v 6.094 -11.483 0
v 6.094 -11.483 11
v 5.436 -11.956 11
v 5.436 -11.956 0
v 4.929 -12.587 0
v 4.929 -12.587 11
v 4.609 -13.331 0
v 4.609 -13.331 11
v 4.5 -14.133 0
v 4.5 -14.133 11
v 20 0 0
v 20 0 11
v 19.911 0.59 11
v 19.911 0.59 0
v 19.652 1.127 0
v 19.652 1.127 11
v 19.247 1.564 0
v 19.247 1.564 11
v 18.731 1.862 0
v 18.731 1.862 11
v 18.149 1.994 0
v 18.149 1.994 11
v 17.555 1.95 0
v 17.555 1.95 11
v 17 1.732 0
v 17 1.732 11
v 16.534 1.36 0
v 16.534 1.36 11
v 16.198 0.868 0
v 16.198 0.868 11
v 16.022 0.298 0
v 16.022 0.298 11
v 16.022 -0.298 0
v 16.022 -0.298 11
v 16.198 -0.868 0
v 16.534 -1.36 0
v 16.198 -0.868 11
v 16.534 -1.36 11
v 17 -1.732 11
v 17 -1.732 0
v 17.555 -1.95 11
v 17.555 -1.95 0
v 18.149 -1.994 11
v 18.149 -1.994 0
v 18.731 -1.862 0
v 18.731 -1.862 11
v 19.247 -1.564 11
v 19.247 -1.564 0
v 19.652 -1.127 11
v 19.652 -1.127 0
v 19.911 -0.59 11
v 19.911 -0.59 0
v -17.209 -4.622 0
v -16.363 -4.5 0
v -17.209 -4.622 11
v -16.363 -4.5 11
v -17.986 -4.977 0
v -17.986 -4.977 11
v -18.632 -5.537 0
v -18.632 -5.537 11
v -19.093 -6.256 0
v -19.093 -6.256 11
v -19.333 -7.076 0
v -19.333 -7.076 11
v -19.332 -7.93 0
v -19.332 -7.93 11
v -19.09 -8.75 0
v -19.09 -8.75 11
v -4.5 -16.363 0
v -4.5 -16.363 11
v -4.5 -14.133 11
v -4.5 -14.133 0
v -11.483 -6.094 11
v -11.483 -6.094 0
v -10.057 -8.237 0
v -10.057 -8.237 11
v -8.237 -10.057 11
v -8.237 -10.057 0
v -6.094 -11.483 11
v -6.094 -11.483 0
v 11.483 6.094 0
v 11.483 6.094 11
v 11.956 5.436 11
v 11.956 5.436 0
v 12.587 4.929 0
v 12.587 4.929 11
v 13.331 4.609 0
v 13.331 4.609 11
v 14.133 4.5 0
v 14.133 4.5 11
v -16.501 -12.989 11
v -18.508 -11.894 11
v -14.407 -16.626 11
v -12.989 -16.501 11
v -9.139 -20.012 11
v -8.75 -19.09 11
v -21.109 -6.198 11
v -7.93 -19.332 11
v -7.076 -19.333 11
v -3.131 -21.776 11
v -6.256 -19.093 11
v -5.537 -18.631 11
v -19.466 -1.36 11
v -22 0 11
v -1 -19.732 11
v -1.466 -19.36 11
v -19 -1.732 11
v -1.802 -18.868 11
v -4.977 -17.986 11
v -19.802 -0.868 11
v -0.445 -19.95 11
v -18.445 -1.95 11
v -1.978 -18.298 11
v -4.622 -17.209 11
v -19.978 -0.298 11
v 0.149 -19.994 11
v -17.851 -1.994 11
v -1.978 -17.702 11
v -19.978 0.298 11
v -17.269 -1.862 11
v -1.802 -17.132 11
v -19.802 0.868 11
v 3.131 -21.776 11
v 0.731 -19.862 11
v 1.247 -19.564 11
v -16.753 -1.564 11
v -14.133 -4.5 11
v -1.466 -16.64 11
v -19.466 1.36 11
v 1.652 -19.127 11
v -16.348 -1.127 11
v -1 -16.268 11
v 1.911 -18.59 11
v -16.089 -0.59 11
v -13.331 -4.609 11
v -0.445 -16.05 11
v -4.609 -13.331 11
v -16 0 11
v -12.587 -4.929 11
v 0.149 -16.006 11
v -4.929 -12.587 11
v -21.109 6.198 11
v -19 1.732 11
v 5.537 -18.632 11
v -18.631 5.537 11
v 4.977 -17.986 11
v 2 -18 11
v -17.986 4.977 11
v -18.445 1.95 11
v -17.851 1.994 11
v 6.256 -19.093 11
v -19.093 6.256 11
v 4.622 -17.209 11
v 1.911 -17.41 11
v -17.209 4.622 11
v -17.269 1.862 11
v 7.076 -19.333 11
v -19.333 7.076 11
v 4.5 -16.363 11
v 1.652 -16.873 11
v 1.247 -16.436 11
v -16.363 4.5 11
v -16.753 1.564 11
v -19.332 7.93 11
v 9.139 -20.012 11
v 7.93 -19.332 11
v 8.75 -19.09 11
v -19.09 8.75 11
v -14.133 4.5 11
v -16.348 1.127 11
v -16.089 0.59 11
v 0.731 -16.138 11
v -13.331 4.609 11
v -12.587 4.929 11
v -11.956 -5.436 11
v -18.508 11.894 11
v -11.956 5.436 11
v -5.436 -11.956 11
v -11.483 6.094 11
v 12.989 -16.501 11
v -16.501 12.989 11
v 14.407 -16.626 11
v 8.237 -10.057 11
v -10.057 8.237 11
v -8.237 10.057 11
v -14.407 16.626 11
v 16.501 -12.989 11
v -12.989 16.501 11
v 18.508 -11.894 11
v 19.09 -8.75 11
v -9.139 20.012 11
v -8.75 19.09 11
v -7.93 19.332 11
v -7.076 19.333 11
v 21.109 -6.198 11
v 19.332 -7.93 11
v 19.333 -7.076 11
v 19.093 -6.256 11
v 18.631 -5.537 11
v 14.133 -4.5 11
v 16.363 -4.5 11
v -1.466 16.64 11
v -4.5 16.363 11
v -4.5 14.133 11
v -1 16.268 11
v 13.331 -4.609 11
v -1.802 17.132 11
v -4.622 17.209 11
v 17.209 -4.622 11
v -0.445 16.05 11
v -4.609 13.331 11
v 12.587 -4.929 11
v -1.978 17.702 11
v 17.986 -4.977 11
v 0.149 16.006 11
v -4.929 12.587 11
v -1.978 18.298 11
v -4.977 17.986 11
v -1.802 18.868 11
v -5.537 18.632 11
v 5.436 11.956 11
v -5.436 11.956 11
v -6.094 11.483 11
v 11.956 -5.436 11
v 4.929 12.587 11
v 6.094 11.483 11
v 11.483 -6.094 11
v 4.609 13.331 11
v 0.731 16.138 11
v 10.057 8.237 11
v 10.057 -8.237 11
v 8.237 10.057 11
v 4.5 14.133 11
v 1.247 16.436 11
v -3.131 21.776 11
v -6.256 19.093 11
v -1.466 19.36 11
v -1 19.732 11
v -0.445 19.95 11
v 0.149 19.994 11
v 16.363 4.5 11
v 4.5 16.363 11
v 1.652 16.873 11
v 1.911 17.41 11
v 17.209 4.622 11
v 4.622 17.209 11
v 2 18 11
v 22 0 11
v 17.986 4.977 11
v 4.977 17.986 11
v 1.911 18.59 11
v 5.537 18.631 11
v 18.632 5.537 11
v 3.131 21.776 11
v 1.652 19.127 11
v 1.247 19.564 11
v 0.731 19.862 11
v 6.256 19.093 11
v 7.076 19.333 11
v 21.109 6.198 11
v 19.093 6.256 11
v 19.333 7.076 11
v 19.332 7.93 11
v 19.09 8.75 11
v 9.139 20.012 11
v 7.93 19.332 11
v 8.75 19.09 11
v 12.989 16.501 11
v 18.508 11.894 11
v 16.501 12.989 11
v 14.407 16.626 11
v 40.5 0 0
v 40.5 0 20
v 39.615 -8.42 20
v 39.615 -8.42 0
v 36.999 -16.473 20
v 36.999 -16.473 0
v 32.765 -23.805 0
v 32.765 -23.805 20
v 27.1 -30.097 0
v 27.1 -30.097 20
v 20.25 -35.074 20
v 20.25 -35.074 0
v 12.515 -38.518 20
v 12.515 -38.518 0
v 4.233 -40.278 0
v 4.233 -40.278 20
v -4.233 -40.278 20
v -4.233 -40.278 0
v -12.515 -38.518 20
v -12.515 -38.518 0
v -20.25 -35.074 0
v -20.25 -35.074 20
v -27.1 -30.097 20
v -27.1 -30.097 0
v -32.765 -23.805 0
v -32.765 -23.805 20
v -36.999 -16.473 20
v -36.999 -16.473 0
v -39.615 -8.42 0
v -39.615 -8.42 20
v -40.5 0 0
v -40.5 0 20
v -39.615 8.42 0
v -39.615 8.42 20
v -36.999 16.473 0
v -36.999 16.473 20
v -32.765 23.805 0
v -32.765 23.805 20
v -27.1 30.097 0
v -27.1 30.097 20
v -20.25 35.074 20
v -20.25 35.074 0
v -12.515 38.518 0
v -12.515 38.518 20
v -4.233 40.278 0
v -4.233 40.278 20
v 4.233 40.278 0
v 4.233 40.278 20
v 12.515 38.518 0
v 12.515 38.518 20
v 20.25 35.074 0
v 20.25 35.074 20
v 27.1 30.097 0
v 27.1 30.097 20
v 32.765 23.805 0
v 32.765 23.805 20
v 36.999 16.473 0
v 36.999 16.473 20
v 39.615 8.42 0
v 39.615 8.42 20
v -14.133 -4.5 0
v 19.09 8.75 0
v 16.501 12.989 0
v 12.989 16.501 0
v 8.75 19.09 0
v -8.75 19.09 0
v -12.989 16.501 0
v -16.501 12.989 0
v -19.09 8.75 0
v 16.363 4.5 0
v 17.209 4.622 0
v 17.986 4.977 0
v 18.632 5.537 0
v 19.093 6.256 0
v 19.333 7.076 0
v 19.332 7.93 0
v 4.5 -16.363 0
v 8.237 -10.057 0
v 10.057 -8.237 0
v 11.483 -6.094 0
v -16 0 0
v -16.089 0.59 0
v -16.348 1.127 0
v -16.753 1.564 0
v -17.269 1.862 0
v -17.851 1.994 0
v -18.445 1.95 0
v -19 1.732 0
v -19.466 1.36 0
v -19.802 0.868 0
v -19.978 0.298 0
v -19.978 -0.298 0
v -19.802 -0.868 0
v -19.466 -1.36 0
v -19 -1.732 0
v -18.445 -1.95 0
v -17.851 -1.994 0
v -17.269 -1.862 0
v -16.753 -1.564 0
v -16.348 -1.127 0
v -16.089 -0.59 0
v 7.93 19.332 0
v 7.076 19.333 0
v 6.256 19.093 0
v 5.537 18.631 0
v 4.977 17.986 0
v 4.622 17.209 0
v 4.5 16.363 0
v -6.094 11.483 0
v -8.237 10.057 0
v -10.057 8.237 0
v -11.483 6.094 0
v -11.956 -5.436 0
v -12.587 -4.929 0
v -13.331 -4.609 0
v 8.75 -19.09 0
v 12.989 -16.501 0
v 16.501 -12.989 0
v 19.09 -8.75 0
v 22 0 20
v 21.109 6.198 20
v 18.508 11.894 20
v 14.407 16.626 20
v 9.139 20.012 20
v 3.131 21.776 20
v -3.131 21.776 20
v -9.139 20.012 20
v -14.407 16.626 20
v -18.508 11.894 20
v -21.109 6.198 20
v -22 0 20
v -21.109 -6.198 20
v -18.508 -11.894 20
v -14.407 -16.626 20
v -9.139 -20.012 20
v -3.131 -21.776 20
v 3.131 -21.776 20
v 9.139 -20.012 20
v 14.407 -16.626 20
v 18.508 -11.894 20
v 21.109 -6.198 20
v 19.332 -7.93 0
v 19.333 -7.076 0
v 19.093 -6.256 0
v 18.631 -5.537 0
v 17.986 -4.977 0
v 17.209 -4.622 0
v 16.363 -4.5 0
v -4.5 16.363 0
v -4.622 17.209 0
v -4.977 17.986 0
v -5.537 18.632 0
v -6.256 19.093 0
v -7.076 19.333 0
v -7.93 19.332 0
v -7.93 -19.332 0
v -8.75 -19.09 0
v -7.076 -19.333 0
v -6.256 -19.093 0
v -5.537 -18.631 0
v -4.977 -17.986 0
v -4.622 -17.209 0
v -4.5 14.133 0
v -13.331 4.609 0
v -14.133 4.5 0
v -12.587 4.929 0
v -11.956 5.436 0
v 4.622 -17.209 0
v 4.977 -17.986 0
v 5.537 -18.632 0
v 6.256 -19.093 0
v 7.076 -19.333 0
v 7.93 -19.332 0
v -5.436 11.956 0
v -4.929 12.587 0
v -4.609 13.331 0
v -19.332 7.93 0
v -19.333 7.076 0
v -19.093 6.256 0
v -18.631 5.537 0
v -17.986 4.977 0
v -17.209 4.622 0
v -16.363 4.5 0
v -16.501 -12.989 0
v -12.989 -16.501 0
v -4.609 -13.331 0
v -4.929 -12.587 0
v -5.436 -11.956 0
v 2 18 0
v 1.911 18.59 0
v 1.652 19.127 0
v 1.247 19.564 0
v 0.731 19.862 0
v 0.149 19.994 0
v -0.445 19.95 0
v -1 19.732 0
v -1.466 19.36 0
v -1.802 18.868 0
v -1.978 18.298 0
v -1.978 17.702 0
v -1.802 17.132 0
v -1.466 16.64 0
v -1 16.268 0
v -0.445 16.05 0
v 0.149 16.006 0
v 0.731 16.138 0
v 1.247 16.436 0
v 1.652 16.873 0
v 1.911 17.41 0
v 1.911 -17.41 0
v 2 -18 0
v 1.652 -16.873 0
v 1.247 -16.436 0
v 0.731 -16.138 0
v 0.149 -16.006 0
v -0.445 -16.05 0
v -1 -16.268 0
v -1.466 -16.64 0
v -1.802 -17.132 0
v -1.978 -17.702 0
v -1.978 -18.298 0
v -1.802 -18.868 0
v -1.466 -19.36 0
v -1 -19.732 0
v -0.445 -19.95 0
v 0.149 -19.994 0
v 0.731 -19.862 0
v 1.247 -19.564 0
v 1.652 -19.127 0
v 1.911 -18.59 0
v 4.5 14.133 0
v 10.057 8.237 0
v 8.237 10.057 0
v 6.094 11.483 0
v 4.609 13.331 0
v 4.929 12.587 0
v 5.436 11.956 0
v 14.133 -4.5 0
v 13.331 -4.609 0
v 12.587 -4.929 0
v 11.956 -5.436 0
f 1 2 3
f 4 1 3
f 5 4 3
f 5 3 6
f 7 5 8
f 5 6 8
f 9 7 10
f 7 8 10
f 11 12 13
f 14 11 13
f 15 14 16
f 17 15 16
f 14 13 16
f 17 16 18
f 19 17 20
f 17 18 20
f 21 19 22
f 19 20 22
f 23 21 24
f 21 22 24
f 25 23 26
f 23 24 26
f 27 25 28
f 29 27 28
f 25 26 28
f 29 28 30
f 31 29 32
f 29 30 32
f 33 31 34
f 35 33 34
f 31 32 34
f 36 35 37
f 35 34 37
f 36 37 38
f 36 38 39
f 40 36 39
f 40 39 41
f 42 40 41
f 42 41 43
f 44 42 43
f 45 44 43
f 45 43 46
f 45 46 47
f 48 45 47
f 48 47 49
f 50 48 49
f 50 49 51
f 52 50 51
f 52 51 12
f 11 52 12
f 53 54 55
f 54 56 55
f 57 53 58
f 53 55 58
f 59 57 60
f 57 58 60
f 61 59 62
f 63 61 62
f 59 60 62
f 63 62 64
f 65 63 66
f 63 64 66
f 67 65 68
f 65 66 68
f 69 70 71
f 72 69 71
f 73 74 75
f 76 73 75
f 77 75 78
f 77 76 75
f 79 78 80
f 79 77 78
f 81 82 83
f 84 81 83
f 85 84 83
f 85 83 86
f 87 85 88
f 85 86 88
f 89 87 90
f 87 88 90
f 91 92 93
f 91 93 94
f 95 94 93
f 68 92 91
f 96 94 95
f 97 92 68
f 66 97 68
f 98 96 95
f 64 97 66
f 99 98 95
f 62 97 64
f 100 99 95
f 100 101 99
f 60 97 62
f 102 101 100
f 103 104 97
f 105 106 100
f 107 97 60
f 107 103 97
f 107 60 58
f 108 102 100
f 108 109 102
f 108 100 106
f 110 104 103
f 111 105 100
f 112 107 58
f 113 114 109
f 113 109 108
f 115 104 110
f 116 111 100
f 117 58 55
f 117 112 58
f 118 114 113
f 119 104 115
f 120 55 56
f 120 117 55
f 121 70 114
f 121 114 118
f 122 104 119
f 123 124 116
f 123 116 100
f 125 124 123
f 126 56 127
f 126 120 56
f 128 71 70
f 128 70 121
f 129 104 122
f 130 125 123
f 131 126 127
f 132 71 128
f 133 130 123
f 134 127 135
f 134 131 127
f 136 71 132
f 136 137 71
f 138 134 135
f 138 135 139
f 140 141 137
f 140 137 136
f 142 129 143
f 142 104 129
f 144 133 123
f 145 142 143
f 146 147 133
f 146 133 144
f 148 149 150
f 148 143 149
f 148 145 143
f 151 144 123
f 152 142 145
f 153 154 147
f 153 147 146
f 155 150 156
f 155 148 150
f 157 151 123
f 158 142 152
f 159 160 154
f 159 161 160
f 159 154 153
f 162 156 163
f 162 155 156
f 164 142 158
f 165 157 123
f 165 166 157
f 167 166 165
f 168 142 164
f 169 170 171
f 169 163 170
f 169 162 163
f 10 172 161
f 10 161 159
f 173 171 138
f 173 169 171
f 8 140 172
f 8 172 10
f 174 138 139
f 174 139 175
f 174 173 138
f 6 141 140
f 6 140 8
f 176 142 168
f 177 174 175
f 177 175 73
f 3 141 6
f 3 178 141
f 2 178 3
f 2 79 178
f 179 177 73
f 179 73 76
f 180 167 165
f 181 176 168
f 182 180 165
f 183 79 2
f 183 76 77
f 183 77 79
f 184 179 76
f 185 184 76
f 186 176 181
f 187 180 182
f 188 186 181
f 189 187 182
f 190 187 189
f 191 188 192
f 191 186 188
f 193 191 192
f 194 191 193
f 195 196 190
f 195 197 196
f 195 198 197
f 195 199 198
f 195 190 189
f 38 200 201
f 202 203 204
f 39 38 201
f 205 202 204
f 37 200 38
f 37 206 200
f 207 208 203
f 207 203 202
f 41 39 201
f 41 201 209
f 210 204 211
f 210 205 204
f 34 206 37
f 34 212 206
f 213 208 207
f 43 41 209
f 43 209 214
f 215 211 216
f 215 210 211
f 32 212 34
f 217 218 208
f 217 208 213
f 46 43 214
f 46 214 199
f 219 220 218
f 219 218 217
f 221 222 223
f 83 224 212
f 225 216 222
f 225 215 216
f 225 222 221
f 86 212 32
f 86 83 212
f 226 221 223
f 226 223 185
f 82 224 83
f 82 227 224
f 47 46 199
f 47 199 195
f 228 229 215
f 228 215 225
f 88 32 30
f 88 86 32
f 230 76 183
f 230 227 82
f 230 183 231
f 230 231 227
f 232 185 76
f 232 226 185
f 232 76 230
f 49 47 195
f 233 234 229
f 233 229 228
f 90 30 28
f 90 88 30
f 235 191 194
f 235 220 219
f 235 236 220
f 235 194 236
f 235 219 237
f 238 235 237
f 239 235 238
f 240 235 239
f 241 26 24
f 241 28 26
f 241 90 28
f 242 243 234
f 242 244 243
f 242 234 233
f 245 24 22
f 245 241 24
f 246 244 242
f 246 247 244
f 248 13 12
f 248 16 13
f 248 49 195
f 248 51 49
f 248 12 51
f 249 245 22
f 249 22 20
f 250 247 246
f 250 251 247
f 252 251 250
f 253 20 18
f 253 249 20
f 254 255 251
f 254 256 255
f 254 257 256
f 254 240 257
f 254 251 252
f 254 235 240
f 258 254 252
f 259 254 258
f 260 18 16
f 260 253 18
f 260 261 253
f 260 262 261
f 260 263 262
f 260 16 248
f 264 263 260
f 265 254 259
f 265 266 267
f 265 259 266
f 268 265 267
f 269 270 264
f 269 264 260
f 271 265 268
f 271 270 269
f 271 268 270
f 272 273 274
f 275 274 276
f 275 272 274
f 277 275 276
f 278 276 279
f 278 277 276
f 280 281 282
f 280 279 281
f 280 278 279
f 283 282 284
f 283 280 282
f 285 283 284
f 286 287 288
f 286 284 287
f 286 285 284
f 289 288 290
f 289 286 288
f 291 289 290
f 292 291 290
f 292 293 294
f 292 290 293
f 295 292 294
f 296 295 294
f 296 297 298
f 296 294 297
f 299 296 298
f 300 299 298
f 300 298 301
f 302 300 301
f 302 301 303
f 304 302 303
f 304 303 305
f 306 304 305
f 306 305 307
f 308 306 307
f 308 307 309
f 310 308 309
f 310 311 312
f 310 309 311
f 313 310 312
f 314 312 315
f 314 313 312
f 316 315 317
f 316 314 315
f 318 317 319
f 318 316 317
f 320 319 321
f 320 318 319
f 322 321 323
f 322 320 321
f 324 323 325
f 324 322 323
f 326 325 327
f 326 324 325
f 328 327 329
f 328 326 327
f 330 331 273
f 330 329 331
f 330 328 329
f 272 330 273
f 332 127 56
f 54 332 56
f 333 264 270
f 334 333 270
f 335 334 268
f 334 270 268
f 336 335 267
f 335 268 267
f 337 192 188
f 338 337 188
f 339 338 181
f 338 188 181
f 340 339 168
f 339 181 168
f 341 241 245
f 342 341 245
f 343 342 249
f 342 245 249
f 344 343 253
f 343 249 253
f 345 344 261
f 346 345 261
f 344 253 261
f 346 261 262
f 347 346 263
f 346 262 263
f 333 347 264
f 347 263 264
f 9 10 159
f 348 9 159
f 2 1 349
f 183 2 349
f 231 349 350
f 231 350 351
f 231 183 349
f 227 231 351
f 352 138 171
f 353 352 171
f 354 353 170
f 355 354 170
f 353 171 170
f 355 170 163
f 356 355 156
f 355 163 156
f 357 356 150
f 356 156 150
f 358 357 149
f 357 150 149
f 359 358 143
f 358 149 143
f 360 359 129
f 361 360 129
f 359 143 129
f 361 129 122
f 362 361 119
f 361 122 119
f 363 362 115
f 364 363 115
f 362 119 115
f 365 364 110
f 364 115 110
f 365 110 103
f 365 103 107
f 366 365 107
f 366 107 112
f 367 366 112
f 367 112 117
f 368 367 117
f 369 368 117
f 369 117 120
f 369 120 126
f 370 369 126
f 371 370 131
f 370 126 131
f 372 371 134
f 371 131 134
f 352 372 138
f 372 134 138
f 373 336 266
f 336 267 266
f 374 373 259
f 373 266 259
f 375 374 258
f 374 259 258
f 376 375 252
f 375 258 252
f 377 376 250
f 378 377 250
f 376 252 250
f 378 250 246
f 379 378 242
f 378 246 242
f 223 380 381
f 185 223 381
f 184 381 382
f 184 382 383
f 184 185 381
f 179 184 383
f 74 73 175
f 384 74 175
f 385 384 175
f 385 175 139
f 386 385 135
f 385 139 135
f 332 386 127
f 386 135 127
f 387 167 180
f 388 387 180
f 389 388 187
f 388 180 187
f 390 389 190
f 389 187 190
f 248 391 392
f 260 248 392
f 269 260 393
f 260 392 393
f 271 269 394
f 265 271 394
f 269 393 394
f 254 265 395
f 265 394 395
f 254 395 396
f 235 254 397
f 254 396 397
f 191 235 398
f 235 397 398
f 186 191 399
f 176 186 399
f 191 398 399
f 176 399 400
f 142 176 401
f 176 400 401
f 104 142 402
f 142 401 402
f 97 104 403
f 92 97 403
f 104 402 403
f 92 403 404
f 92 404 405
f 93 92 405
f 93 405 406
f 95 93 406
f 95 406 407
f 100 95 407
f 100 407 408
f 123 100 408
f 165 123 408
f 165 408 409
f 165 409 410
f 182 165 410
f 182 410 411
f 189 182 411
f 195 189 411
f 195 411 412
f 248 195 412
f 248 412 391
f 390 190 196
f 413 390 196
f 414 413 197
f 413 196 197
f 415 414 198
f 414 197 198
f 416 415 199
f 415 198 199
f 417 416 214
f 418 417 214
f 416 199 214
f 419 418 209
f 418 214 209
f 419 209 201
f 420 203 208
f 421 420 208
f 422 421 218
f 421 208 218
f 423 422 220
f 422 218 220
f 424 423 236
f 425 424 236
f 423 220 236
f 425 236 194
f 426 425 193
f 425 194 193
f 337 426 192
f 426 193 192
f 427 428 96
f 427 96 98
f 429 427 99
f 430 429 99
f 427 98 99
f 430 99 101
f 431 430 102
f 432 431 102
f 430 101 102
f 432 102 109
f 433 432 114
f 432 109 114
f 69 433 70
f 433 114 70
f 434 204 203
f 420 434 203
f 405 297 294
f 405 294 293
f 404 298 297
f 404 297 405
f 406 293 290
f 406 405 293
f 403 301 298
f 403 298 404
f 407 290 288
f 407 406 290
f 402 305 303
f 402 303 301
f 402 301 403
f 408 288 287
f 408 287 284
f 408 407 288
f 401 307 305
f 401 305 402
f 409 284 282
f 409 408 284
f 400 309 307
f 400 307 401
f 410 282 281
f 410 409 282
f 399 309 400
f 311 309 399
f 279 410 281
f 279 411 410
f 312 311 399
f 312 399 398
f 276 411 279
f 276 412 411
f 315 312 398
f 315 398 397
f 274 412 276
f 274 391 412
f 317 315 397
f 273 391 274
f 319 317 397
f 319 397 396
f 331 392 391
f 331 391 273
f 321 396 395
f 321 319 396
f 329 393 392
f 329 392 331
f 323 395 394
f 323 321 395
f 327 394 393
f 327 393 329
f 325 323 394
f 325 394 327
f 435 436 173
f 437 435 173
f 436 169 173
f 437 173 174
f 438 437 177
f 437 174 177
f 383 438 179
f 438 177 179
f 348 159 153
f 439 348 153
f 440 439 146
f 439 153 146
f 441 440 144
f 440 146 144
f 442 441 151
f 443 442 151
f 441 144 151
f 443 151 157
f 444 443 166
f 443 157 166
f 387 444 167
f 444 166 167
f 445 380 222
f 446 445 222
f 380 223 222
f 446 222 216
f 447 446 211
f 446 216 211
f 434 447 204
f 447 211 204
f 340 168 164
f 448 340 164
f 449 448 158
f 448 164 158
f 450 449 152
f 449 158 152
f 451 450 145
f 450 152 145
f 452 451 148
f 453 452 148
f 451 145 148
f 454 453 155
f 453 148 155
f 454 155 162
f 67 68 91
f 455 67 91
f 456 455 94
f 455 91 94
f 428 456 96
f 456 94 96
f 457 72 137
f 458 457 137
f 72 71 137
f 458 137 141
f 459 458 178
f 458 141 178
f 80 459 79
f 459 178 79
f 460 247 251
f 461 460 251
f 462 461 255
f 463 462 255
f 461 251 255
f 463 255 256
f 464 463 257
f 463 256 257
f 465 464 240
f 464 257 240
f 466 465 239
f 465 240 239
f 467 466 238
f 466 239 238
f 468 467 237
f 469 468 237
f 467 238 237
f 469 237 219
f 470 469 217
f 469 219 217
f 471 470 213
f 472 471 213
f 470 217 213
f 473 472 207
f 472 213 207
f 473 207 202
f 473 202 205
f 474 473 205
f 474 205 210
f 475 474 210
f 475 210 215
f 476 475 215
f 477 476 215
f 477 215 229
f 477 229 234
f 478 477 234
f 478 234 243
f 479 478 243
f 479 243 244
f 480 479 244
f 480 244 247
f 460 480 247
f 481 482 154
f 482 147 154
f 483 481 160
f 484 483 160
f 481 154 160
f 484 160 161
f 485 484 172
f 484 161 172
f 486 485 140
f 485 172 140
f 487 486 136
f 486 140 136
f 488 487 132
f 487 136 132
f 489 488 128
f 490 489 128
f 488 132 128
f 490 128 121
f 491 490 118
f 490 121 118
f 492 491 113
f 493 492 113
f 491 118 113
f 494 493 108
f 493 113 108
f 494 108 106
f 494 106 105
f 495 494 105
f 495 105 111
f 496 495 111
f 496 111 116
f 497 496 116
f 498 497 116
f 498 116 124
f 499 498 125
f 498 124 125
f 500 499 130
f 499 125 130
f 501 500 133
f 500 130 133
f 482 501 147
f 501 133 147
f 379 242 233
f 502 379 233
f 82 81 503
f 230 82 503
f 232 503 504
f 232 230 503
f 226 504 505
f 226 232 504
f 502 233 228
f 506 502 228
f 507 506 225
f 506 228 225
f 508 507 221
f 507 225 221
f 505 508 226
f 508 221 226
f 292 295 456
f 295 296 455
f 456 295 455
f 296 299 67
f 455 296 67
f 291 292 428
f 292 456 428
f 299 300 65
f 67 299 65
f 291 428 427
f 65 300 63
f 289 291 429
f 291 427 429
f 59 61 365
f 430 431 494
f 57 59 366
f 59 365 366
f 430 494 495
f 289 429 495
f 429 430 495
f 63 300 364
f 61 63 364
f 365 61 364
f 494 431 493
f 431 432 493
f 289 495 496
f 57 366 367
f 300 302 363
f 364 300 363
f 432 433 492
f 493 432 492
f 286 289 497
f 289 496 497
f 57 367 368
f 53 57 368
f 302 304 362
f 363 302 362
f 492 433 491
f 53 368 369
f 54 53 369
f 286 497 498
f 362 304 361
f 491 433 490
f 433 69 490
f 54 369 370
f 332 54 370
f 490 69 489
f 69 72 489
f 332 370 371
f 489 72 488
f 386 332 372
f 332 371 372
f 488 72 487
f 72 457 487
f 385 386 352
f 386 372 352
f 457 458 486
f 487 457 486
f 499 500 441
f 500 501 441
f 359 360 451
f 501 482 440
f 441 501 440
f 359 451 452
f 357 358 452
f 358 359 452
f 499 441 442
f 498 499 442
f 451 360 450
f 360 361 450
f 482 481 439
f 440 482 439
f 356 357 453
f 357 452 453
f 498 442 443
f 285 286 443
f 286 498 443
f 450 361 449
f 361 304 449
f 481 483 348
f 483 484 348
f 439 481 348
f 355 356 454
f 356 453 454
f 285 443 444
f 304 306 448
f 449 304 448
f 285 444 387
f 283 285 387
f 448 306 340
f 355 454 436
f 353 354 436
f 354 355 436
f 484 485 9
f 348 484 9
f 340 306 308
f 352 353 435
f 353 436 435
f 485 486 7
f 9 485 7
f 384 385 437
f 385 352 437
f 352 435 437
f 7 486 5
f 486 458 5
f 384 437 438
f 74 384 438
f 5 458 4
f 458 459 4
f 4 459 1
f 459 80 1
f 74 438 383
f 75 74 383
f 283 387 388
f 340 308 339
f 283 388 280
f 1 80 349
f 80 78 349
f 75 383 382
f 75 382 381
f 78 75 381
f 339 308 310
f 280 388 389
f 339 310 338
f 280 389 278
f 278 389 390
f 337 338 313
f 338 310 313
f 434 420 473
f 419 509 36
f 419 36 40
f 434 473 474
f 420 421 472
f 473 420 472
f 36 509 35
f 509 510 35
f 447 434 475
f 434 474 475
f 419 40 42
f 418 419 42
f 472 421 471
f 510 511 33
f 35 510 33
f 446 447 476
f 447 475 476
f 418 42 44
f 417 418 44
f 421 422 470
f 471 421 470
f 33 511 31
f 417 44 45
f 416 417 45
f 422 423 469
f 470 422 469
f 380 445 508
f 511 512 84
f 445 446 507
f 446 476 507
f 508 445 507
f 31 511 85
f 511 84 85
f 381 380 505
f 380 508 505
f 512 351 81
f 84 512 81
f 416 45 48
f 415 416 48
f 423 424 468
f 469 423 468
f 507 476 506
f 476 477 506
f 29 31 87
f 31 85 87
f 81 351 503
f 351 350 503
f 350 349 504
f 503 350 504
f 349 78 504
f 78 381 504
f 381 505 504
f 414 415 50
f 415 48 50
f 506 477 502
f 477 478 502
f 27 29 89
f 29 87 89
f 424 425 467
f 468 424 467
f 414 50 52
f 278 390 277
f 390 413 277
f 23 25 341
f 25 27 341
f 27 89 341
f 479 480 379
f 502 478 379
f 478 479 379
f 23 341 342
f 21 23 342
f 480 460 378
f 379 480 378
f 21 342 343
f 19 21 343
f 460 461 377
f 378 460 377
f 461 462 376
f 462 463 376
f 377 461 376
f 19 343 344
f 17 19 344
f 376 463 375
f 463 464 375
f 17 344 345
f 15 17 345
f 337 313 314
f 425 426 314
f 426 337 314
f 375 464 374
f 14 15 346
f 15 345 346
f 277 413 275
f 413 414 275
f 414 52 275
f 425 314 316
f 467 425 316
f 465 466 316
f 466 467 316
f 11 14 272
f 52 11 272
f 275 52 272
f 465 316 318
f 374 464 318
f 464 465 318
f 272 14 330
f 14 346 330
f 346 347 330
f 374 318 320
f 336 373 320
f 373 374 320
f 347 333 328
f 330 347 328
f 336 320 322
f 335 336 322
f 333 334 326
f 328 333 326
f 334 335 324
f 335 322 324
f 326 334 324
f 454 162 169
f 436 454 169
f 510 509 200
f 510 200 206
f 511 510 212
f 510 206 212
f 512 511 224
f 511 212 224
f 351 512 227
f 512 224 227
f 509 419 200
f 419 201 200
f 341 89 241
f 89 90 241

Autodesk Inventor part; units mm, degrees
sketch "Sketch1" plane through (0, 0, 0) normal (0, 0, 1) x (1, 0, 0)
  circle A0 centre (0, 0) radius 40.5
  dimension "d0" = 81
extrude "Extrusion1" add sketch "Sketch1" along normal blind 20
sketch "Sketch2" plane through (0, 0, 20) normal (0, 0, 1) x (1, 0, 0)
  circle A0 centre (0, 0) radius 22
  dimension "d3" = 44
extrude "Extrusion2" cut sketch "Sketch2" against normal blind 9
sketch "Sketch3" plane through (0, 0, 11) normal (0, 0, 1) x (1, 0, 0)
  circle A0 centre (0, 18) radius 2
  circle A1 centre (-18, 0) radius 2
  circle A2 centre (0, -18) radius 2
  circle A3 centre (18, 0) radius 2
  point P0 (0, 0)
  dimension "d6" = 4
  dimension "d7" = 18
  dimension "d10" = 360
extrude "Extrusion3" cut sketch "Sketch3" against normal blind 12.75
sketch "Sketch4" plane through (0, 0, 11) normal (0, 0, 1) x (1, 0, 0)
  arc A0 (-4.5165, 17.448) -> (-8.8542, 19.2414) centre (-7.5165, 16.3345) ccw
  arc A1 (-8.8542, 19.2414) -> (-19.0977, 9.16) centre (0, 0) ccw
  arc A2 (-14.1333, 4.5) -> (-11.4833, 6.0938) centre (-14.1333, 7.5) ccw
  line L0 (-4.5, 14.1333) -> (-4.5, 16.3631)
  arc A3 (-4.5, 16.3631) -> (-8.75, 19.0902) centre (-7.5, 16.3631) ccw
  arc A4 (-6.0938, 11.4833) -> (-4.5, 14.1333) centre (-7.5, 14.1333) ccw
  arc A5 (-6.0938, 11.4833) -> (-11.4833, 6.0938) centre (0, 0) ccw
  arc A6 (-8.8542, 19.2414) -> (-19.2547, 8.8254) centre (0, 0) ccw
  arc A7 (-8.75, 19.0902) -> (-19.0902, 8.75) centre (0, 0) ccw
  arc A8 (-19.0902, 8.75) -> (-16.3631, 4.5) centre (-16.3631, 7.5) ccw
  line L1 (-16.3631, 4.5) -> (-14.1333, 4.5)
  arc A9 (-11.4833, -6.0938) -> (-14.1333, -4.5) centre (-14.1333, -7.5) ccw
  arc A10 (-4.5, -14.1333) -> (-6.0938, -11.4833) centre (-7.5, -14.1333) ccw
  arc A11 (-11.4833, -6.0938) -> (-6.0938, -11.4833) centre (0, 0) ccw
  line L2 (-14.1333, -4.5) -> (-16.3631, -4.5)
  line L3 (-4.5, -16.3631) -> (-4.5, -14.1333)
  arc A12 (-16.3631, -4.5) -> (-19.0902, -8.75) centre (-16.3631, -7.5) ccw
  arc A13 (-17.448, -4.5165) -> (-19.2414, -8.8542) centre (-16.3345, -7.5165) ccw
  arc A14 (-8.75, -19.0902) -> (-4.5, -16.3631) centre (-7.5, -16.3631) ccw
  arc A15 (-19.0902, -8.75) -> (-8.75, -19.0902) centre (0, 0) ccw
  arc A16 (-19.2414, -8.8542) -> (-9.16, -19.0977) centre (0, 0) ccw
  arc A17 (-19.2414, -8.8542) -> (-8.8254, -19.2547) centre (0, 0) ccw
  arc A18 (6.0938, -11.4833) -> (4.5, -14.1333) centre (7.5, -14.1333) ccw
  arc A19 (14.1333, -4.5) -> (11.4833, -6.0938) centre (14.1333, -7.5) ccw
  arc A20 (6.0938, -11.4833) -> (11.4833, -6.0938) centre (0, 0) ccw
  line L4 (4.5, -14.1333) -> (4.5, -16.3631)
  line L5 (16.3631, -4.5) -> (14.1333, -4.5)
  arc A21 (4.5, -16.3631) -> (8.75, -19.0902) centre (7.5, -16.3631) ccw
  arc A22 (4.5165, -17.448) -> (8.8542, -19.2414) centre (7.5165, -16.3345) ccw
  arc A23 (19.0902, -8.75) -> (16.3631, -4.5) centre (16.3631, -7.5) ccw
  arc A24 (8.75, -19.0902) -> (19.0902, -8.75) centre (0, 0) ccw
  arc A25 (8.8542, -19.2414) -> (19.0977, -9.16) centre (0, 0) ccw
  arc A26 (8.8542, -19.2414) -> (19.2547, -8.8254) centre (0, 0) ccw
  arc A27 (11.4833, 6.0938) -> (14.1333, 4.5) centre (14.1333, 7.5) ccw
  arc A28 (4.5, 14.1333) -> (6.0938, 11.4833) centre (7.5, 14.1333) ccw
  arc A29 (11.4833, 6.0938) -> (6.0938, 11.4833) centre (0, 0) ccw
  line L6 (14.1333, 4.5) -> (16.3631, 4.5)
  line L7 (4.5, 16.3631) -> (4.5, 14.1333)
  arc A30 (16.3631, 4.5) -> (19.0902, 8.75) centre (16.3631, 7.5) ccw
  arc A31 (17.448, 4.5165) -> (19.2414, 8.8542) centre (16.3345, 7.5165) ccw
  arc A32 (8.75, 19.0902) -> (4.5, 16.3631) centre (7.5, 16.3631) ccw
  arc A33 (19.0902, 8.75) -> (8.75, 19.0902) centre (0, 0) ccw
  arc A34 (19.2414, 8.8542) -> (9.16, 19.0977) centre (0, 0) ccw
  arc A35 (19.2414, 8.8542) -> (8.8254, 19.2547) centre (0, 0) ccw
  point P0 (41.0732, 32.7294)
  point P1 (-17.4931, 4.4714)
  point P2 (-16.3796, 7.4714)
  point P3 (-7.4714, -16.3796)
  point P4 (-4.4714, -17.4931)
  point P5 (16.3796, -7.4714)
  point P6 (17.4931, -4.4714)
  point P7 (7.4714, 16.3796)
  point P8 (4.4714, 17.4931)
  dimension "d16" = 360
extrude "Extrusion4" cut sketch "Sketch4" against normal blind 12.75
ref_plane "Work Plane1" through (40.7, 0, 0) normal (1, 0, 0) x (0, 1, 0)
properties part number "MotorHousing" material "Plastic, Opaque White"
